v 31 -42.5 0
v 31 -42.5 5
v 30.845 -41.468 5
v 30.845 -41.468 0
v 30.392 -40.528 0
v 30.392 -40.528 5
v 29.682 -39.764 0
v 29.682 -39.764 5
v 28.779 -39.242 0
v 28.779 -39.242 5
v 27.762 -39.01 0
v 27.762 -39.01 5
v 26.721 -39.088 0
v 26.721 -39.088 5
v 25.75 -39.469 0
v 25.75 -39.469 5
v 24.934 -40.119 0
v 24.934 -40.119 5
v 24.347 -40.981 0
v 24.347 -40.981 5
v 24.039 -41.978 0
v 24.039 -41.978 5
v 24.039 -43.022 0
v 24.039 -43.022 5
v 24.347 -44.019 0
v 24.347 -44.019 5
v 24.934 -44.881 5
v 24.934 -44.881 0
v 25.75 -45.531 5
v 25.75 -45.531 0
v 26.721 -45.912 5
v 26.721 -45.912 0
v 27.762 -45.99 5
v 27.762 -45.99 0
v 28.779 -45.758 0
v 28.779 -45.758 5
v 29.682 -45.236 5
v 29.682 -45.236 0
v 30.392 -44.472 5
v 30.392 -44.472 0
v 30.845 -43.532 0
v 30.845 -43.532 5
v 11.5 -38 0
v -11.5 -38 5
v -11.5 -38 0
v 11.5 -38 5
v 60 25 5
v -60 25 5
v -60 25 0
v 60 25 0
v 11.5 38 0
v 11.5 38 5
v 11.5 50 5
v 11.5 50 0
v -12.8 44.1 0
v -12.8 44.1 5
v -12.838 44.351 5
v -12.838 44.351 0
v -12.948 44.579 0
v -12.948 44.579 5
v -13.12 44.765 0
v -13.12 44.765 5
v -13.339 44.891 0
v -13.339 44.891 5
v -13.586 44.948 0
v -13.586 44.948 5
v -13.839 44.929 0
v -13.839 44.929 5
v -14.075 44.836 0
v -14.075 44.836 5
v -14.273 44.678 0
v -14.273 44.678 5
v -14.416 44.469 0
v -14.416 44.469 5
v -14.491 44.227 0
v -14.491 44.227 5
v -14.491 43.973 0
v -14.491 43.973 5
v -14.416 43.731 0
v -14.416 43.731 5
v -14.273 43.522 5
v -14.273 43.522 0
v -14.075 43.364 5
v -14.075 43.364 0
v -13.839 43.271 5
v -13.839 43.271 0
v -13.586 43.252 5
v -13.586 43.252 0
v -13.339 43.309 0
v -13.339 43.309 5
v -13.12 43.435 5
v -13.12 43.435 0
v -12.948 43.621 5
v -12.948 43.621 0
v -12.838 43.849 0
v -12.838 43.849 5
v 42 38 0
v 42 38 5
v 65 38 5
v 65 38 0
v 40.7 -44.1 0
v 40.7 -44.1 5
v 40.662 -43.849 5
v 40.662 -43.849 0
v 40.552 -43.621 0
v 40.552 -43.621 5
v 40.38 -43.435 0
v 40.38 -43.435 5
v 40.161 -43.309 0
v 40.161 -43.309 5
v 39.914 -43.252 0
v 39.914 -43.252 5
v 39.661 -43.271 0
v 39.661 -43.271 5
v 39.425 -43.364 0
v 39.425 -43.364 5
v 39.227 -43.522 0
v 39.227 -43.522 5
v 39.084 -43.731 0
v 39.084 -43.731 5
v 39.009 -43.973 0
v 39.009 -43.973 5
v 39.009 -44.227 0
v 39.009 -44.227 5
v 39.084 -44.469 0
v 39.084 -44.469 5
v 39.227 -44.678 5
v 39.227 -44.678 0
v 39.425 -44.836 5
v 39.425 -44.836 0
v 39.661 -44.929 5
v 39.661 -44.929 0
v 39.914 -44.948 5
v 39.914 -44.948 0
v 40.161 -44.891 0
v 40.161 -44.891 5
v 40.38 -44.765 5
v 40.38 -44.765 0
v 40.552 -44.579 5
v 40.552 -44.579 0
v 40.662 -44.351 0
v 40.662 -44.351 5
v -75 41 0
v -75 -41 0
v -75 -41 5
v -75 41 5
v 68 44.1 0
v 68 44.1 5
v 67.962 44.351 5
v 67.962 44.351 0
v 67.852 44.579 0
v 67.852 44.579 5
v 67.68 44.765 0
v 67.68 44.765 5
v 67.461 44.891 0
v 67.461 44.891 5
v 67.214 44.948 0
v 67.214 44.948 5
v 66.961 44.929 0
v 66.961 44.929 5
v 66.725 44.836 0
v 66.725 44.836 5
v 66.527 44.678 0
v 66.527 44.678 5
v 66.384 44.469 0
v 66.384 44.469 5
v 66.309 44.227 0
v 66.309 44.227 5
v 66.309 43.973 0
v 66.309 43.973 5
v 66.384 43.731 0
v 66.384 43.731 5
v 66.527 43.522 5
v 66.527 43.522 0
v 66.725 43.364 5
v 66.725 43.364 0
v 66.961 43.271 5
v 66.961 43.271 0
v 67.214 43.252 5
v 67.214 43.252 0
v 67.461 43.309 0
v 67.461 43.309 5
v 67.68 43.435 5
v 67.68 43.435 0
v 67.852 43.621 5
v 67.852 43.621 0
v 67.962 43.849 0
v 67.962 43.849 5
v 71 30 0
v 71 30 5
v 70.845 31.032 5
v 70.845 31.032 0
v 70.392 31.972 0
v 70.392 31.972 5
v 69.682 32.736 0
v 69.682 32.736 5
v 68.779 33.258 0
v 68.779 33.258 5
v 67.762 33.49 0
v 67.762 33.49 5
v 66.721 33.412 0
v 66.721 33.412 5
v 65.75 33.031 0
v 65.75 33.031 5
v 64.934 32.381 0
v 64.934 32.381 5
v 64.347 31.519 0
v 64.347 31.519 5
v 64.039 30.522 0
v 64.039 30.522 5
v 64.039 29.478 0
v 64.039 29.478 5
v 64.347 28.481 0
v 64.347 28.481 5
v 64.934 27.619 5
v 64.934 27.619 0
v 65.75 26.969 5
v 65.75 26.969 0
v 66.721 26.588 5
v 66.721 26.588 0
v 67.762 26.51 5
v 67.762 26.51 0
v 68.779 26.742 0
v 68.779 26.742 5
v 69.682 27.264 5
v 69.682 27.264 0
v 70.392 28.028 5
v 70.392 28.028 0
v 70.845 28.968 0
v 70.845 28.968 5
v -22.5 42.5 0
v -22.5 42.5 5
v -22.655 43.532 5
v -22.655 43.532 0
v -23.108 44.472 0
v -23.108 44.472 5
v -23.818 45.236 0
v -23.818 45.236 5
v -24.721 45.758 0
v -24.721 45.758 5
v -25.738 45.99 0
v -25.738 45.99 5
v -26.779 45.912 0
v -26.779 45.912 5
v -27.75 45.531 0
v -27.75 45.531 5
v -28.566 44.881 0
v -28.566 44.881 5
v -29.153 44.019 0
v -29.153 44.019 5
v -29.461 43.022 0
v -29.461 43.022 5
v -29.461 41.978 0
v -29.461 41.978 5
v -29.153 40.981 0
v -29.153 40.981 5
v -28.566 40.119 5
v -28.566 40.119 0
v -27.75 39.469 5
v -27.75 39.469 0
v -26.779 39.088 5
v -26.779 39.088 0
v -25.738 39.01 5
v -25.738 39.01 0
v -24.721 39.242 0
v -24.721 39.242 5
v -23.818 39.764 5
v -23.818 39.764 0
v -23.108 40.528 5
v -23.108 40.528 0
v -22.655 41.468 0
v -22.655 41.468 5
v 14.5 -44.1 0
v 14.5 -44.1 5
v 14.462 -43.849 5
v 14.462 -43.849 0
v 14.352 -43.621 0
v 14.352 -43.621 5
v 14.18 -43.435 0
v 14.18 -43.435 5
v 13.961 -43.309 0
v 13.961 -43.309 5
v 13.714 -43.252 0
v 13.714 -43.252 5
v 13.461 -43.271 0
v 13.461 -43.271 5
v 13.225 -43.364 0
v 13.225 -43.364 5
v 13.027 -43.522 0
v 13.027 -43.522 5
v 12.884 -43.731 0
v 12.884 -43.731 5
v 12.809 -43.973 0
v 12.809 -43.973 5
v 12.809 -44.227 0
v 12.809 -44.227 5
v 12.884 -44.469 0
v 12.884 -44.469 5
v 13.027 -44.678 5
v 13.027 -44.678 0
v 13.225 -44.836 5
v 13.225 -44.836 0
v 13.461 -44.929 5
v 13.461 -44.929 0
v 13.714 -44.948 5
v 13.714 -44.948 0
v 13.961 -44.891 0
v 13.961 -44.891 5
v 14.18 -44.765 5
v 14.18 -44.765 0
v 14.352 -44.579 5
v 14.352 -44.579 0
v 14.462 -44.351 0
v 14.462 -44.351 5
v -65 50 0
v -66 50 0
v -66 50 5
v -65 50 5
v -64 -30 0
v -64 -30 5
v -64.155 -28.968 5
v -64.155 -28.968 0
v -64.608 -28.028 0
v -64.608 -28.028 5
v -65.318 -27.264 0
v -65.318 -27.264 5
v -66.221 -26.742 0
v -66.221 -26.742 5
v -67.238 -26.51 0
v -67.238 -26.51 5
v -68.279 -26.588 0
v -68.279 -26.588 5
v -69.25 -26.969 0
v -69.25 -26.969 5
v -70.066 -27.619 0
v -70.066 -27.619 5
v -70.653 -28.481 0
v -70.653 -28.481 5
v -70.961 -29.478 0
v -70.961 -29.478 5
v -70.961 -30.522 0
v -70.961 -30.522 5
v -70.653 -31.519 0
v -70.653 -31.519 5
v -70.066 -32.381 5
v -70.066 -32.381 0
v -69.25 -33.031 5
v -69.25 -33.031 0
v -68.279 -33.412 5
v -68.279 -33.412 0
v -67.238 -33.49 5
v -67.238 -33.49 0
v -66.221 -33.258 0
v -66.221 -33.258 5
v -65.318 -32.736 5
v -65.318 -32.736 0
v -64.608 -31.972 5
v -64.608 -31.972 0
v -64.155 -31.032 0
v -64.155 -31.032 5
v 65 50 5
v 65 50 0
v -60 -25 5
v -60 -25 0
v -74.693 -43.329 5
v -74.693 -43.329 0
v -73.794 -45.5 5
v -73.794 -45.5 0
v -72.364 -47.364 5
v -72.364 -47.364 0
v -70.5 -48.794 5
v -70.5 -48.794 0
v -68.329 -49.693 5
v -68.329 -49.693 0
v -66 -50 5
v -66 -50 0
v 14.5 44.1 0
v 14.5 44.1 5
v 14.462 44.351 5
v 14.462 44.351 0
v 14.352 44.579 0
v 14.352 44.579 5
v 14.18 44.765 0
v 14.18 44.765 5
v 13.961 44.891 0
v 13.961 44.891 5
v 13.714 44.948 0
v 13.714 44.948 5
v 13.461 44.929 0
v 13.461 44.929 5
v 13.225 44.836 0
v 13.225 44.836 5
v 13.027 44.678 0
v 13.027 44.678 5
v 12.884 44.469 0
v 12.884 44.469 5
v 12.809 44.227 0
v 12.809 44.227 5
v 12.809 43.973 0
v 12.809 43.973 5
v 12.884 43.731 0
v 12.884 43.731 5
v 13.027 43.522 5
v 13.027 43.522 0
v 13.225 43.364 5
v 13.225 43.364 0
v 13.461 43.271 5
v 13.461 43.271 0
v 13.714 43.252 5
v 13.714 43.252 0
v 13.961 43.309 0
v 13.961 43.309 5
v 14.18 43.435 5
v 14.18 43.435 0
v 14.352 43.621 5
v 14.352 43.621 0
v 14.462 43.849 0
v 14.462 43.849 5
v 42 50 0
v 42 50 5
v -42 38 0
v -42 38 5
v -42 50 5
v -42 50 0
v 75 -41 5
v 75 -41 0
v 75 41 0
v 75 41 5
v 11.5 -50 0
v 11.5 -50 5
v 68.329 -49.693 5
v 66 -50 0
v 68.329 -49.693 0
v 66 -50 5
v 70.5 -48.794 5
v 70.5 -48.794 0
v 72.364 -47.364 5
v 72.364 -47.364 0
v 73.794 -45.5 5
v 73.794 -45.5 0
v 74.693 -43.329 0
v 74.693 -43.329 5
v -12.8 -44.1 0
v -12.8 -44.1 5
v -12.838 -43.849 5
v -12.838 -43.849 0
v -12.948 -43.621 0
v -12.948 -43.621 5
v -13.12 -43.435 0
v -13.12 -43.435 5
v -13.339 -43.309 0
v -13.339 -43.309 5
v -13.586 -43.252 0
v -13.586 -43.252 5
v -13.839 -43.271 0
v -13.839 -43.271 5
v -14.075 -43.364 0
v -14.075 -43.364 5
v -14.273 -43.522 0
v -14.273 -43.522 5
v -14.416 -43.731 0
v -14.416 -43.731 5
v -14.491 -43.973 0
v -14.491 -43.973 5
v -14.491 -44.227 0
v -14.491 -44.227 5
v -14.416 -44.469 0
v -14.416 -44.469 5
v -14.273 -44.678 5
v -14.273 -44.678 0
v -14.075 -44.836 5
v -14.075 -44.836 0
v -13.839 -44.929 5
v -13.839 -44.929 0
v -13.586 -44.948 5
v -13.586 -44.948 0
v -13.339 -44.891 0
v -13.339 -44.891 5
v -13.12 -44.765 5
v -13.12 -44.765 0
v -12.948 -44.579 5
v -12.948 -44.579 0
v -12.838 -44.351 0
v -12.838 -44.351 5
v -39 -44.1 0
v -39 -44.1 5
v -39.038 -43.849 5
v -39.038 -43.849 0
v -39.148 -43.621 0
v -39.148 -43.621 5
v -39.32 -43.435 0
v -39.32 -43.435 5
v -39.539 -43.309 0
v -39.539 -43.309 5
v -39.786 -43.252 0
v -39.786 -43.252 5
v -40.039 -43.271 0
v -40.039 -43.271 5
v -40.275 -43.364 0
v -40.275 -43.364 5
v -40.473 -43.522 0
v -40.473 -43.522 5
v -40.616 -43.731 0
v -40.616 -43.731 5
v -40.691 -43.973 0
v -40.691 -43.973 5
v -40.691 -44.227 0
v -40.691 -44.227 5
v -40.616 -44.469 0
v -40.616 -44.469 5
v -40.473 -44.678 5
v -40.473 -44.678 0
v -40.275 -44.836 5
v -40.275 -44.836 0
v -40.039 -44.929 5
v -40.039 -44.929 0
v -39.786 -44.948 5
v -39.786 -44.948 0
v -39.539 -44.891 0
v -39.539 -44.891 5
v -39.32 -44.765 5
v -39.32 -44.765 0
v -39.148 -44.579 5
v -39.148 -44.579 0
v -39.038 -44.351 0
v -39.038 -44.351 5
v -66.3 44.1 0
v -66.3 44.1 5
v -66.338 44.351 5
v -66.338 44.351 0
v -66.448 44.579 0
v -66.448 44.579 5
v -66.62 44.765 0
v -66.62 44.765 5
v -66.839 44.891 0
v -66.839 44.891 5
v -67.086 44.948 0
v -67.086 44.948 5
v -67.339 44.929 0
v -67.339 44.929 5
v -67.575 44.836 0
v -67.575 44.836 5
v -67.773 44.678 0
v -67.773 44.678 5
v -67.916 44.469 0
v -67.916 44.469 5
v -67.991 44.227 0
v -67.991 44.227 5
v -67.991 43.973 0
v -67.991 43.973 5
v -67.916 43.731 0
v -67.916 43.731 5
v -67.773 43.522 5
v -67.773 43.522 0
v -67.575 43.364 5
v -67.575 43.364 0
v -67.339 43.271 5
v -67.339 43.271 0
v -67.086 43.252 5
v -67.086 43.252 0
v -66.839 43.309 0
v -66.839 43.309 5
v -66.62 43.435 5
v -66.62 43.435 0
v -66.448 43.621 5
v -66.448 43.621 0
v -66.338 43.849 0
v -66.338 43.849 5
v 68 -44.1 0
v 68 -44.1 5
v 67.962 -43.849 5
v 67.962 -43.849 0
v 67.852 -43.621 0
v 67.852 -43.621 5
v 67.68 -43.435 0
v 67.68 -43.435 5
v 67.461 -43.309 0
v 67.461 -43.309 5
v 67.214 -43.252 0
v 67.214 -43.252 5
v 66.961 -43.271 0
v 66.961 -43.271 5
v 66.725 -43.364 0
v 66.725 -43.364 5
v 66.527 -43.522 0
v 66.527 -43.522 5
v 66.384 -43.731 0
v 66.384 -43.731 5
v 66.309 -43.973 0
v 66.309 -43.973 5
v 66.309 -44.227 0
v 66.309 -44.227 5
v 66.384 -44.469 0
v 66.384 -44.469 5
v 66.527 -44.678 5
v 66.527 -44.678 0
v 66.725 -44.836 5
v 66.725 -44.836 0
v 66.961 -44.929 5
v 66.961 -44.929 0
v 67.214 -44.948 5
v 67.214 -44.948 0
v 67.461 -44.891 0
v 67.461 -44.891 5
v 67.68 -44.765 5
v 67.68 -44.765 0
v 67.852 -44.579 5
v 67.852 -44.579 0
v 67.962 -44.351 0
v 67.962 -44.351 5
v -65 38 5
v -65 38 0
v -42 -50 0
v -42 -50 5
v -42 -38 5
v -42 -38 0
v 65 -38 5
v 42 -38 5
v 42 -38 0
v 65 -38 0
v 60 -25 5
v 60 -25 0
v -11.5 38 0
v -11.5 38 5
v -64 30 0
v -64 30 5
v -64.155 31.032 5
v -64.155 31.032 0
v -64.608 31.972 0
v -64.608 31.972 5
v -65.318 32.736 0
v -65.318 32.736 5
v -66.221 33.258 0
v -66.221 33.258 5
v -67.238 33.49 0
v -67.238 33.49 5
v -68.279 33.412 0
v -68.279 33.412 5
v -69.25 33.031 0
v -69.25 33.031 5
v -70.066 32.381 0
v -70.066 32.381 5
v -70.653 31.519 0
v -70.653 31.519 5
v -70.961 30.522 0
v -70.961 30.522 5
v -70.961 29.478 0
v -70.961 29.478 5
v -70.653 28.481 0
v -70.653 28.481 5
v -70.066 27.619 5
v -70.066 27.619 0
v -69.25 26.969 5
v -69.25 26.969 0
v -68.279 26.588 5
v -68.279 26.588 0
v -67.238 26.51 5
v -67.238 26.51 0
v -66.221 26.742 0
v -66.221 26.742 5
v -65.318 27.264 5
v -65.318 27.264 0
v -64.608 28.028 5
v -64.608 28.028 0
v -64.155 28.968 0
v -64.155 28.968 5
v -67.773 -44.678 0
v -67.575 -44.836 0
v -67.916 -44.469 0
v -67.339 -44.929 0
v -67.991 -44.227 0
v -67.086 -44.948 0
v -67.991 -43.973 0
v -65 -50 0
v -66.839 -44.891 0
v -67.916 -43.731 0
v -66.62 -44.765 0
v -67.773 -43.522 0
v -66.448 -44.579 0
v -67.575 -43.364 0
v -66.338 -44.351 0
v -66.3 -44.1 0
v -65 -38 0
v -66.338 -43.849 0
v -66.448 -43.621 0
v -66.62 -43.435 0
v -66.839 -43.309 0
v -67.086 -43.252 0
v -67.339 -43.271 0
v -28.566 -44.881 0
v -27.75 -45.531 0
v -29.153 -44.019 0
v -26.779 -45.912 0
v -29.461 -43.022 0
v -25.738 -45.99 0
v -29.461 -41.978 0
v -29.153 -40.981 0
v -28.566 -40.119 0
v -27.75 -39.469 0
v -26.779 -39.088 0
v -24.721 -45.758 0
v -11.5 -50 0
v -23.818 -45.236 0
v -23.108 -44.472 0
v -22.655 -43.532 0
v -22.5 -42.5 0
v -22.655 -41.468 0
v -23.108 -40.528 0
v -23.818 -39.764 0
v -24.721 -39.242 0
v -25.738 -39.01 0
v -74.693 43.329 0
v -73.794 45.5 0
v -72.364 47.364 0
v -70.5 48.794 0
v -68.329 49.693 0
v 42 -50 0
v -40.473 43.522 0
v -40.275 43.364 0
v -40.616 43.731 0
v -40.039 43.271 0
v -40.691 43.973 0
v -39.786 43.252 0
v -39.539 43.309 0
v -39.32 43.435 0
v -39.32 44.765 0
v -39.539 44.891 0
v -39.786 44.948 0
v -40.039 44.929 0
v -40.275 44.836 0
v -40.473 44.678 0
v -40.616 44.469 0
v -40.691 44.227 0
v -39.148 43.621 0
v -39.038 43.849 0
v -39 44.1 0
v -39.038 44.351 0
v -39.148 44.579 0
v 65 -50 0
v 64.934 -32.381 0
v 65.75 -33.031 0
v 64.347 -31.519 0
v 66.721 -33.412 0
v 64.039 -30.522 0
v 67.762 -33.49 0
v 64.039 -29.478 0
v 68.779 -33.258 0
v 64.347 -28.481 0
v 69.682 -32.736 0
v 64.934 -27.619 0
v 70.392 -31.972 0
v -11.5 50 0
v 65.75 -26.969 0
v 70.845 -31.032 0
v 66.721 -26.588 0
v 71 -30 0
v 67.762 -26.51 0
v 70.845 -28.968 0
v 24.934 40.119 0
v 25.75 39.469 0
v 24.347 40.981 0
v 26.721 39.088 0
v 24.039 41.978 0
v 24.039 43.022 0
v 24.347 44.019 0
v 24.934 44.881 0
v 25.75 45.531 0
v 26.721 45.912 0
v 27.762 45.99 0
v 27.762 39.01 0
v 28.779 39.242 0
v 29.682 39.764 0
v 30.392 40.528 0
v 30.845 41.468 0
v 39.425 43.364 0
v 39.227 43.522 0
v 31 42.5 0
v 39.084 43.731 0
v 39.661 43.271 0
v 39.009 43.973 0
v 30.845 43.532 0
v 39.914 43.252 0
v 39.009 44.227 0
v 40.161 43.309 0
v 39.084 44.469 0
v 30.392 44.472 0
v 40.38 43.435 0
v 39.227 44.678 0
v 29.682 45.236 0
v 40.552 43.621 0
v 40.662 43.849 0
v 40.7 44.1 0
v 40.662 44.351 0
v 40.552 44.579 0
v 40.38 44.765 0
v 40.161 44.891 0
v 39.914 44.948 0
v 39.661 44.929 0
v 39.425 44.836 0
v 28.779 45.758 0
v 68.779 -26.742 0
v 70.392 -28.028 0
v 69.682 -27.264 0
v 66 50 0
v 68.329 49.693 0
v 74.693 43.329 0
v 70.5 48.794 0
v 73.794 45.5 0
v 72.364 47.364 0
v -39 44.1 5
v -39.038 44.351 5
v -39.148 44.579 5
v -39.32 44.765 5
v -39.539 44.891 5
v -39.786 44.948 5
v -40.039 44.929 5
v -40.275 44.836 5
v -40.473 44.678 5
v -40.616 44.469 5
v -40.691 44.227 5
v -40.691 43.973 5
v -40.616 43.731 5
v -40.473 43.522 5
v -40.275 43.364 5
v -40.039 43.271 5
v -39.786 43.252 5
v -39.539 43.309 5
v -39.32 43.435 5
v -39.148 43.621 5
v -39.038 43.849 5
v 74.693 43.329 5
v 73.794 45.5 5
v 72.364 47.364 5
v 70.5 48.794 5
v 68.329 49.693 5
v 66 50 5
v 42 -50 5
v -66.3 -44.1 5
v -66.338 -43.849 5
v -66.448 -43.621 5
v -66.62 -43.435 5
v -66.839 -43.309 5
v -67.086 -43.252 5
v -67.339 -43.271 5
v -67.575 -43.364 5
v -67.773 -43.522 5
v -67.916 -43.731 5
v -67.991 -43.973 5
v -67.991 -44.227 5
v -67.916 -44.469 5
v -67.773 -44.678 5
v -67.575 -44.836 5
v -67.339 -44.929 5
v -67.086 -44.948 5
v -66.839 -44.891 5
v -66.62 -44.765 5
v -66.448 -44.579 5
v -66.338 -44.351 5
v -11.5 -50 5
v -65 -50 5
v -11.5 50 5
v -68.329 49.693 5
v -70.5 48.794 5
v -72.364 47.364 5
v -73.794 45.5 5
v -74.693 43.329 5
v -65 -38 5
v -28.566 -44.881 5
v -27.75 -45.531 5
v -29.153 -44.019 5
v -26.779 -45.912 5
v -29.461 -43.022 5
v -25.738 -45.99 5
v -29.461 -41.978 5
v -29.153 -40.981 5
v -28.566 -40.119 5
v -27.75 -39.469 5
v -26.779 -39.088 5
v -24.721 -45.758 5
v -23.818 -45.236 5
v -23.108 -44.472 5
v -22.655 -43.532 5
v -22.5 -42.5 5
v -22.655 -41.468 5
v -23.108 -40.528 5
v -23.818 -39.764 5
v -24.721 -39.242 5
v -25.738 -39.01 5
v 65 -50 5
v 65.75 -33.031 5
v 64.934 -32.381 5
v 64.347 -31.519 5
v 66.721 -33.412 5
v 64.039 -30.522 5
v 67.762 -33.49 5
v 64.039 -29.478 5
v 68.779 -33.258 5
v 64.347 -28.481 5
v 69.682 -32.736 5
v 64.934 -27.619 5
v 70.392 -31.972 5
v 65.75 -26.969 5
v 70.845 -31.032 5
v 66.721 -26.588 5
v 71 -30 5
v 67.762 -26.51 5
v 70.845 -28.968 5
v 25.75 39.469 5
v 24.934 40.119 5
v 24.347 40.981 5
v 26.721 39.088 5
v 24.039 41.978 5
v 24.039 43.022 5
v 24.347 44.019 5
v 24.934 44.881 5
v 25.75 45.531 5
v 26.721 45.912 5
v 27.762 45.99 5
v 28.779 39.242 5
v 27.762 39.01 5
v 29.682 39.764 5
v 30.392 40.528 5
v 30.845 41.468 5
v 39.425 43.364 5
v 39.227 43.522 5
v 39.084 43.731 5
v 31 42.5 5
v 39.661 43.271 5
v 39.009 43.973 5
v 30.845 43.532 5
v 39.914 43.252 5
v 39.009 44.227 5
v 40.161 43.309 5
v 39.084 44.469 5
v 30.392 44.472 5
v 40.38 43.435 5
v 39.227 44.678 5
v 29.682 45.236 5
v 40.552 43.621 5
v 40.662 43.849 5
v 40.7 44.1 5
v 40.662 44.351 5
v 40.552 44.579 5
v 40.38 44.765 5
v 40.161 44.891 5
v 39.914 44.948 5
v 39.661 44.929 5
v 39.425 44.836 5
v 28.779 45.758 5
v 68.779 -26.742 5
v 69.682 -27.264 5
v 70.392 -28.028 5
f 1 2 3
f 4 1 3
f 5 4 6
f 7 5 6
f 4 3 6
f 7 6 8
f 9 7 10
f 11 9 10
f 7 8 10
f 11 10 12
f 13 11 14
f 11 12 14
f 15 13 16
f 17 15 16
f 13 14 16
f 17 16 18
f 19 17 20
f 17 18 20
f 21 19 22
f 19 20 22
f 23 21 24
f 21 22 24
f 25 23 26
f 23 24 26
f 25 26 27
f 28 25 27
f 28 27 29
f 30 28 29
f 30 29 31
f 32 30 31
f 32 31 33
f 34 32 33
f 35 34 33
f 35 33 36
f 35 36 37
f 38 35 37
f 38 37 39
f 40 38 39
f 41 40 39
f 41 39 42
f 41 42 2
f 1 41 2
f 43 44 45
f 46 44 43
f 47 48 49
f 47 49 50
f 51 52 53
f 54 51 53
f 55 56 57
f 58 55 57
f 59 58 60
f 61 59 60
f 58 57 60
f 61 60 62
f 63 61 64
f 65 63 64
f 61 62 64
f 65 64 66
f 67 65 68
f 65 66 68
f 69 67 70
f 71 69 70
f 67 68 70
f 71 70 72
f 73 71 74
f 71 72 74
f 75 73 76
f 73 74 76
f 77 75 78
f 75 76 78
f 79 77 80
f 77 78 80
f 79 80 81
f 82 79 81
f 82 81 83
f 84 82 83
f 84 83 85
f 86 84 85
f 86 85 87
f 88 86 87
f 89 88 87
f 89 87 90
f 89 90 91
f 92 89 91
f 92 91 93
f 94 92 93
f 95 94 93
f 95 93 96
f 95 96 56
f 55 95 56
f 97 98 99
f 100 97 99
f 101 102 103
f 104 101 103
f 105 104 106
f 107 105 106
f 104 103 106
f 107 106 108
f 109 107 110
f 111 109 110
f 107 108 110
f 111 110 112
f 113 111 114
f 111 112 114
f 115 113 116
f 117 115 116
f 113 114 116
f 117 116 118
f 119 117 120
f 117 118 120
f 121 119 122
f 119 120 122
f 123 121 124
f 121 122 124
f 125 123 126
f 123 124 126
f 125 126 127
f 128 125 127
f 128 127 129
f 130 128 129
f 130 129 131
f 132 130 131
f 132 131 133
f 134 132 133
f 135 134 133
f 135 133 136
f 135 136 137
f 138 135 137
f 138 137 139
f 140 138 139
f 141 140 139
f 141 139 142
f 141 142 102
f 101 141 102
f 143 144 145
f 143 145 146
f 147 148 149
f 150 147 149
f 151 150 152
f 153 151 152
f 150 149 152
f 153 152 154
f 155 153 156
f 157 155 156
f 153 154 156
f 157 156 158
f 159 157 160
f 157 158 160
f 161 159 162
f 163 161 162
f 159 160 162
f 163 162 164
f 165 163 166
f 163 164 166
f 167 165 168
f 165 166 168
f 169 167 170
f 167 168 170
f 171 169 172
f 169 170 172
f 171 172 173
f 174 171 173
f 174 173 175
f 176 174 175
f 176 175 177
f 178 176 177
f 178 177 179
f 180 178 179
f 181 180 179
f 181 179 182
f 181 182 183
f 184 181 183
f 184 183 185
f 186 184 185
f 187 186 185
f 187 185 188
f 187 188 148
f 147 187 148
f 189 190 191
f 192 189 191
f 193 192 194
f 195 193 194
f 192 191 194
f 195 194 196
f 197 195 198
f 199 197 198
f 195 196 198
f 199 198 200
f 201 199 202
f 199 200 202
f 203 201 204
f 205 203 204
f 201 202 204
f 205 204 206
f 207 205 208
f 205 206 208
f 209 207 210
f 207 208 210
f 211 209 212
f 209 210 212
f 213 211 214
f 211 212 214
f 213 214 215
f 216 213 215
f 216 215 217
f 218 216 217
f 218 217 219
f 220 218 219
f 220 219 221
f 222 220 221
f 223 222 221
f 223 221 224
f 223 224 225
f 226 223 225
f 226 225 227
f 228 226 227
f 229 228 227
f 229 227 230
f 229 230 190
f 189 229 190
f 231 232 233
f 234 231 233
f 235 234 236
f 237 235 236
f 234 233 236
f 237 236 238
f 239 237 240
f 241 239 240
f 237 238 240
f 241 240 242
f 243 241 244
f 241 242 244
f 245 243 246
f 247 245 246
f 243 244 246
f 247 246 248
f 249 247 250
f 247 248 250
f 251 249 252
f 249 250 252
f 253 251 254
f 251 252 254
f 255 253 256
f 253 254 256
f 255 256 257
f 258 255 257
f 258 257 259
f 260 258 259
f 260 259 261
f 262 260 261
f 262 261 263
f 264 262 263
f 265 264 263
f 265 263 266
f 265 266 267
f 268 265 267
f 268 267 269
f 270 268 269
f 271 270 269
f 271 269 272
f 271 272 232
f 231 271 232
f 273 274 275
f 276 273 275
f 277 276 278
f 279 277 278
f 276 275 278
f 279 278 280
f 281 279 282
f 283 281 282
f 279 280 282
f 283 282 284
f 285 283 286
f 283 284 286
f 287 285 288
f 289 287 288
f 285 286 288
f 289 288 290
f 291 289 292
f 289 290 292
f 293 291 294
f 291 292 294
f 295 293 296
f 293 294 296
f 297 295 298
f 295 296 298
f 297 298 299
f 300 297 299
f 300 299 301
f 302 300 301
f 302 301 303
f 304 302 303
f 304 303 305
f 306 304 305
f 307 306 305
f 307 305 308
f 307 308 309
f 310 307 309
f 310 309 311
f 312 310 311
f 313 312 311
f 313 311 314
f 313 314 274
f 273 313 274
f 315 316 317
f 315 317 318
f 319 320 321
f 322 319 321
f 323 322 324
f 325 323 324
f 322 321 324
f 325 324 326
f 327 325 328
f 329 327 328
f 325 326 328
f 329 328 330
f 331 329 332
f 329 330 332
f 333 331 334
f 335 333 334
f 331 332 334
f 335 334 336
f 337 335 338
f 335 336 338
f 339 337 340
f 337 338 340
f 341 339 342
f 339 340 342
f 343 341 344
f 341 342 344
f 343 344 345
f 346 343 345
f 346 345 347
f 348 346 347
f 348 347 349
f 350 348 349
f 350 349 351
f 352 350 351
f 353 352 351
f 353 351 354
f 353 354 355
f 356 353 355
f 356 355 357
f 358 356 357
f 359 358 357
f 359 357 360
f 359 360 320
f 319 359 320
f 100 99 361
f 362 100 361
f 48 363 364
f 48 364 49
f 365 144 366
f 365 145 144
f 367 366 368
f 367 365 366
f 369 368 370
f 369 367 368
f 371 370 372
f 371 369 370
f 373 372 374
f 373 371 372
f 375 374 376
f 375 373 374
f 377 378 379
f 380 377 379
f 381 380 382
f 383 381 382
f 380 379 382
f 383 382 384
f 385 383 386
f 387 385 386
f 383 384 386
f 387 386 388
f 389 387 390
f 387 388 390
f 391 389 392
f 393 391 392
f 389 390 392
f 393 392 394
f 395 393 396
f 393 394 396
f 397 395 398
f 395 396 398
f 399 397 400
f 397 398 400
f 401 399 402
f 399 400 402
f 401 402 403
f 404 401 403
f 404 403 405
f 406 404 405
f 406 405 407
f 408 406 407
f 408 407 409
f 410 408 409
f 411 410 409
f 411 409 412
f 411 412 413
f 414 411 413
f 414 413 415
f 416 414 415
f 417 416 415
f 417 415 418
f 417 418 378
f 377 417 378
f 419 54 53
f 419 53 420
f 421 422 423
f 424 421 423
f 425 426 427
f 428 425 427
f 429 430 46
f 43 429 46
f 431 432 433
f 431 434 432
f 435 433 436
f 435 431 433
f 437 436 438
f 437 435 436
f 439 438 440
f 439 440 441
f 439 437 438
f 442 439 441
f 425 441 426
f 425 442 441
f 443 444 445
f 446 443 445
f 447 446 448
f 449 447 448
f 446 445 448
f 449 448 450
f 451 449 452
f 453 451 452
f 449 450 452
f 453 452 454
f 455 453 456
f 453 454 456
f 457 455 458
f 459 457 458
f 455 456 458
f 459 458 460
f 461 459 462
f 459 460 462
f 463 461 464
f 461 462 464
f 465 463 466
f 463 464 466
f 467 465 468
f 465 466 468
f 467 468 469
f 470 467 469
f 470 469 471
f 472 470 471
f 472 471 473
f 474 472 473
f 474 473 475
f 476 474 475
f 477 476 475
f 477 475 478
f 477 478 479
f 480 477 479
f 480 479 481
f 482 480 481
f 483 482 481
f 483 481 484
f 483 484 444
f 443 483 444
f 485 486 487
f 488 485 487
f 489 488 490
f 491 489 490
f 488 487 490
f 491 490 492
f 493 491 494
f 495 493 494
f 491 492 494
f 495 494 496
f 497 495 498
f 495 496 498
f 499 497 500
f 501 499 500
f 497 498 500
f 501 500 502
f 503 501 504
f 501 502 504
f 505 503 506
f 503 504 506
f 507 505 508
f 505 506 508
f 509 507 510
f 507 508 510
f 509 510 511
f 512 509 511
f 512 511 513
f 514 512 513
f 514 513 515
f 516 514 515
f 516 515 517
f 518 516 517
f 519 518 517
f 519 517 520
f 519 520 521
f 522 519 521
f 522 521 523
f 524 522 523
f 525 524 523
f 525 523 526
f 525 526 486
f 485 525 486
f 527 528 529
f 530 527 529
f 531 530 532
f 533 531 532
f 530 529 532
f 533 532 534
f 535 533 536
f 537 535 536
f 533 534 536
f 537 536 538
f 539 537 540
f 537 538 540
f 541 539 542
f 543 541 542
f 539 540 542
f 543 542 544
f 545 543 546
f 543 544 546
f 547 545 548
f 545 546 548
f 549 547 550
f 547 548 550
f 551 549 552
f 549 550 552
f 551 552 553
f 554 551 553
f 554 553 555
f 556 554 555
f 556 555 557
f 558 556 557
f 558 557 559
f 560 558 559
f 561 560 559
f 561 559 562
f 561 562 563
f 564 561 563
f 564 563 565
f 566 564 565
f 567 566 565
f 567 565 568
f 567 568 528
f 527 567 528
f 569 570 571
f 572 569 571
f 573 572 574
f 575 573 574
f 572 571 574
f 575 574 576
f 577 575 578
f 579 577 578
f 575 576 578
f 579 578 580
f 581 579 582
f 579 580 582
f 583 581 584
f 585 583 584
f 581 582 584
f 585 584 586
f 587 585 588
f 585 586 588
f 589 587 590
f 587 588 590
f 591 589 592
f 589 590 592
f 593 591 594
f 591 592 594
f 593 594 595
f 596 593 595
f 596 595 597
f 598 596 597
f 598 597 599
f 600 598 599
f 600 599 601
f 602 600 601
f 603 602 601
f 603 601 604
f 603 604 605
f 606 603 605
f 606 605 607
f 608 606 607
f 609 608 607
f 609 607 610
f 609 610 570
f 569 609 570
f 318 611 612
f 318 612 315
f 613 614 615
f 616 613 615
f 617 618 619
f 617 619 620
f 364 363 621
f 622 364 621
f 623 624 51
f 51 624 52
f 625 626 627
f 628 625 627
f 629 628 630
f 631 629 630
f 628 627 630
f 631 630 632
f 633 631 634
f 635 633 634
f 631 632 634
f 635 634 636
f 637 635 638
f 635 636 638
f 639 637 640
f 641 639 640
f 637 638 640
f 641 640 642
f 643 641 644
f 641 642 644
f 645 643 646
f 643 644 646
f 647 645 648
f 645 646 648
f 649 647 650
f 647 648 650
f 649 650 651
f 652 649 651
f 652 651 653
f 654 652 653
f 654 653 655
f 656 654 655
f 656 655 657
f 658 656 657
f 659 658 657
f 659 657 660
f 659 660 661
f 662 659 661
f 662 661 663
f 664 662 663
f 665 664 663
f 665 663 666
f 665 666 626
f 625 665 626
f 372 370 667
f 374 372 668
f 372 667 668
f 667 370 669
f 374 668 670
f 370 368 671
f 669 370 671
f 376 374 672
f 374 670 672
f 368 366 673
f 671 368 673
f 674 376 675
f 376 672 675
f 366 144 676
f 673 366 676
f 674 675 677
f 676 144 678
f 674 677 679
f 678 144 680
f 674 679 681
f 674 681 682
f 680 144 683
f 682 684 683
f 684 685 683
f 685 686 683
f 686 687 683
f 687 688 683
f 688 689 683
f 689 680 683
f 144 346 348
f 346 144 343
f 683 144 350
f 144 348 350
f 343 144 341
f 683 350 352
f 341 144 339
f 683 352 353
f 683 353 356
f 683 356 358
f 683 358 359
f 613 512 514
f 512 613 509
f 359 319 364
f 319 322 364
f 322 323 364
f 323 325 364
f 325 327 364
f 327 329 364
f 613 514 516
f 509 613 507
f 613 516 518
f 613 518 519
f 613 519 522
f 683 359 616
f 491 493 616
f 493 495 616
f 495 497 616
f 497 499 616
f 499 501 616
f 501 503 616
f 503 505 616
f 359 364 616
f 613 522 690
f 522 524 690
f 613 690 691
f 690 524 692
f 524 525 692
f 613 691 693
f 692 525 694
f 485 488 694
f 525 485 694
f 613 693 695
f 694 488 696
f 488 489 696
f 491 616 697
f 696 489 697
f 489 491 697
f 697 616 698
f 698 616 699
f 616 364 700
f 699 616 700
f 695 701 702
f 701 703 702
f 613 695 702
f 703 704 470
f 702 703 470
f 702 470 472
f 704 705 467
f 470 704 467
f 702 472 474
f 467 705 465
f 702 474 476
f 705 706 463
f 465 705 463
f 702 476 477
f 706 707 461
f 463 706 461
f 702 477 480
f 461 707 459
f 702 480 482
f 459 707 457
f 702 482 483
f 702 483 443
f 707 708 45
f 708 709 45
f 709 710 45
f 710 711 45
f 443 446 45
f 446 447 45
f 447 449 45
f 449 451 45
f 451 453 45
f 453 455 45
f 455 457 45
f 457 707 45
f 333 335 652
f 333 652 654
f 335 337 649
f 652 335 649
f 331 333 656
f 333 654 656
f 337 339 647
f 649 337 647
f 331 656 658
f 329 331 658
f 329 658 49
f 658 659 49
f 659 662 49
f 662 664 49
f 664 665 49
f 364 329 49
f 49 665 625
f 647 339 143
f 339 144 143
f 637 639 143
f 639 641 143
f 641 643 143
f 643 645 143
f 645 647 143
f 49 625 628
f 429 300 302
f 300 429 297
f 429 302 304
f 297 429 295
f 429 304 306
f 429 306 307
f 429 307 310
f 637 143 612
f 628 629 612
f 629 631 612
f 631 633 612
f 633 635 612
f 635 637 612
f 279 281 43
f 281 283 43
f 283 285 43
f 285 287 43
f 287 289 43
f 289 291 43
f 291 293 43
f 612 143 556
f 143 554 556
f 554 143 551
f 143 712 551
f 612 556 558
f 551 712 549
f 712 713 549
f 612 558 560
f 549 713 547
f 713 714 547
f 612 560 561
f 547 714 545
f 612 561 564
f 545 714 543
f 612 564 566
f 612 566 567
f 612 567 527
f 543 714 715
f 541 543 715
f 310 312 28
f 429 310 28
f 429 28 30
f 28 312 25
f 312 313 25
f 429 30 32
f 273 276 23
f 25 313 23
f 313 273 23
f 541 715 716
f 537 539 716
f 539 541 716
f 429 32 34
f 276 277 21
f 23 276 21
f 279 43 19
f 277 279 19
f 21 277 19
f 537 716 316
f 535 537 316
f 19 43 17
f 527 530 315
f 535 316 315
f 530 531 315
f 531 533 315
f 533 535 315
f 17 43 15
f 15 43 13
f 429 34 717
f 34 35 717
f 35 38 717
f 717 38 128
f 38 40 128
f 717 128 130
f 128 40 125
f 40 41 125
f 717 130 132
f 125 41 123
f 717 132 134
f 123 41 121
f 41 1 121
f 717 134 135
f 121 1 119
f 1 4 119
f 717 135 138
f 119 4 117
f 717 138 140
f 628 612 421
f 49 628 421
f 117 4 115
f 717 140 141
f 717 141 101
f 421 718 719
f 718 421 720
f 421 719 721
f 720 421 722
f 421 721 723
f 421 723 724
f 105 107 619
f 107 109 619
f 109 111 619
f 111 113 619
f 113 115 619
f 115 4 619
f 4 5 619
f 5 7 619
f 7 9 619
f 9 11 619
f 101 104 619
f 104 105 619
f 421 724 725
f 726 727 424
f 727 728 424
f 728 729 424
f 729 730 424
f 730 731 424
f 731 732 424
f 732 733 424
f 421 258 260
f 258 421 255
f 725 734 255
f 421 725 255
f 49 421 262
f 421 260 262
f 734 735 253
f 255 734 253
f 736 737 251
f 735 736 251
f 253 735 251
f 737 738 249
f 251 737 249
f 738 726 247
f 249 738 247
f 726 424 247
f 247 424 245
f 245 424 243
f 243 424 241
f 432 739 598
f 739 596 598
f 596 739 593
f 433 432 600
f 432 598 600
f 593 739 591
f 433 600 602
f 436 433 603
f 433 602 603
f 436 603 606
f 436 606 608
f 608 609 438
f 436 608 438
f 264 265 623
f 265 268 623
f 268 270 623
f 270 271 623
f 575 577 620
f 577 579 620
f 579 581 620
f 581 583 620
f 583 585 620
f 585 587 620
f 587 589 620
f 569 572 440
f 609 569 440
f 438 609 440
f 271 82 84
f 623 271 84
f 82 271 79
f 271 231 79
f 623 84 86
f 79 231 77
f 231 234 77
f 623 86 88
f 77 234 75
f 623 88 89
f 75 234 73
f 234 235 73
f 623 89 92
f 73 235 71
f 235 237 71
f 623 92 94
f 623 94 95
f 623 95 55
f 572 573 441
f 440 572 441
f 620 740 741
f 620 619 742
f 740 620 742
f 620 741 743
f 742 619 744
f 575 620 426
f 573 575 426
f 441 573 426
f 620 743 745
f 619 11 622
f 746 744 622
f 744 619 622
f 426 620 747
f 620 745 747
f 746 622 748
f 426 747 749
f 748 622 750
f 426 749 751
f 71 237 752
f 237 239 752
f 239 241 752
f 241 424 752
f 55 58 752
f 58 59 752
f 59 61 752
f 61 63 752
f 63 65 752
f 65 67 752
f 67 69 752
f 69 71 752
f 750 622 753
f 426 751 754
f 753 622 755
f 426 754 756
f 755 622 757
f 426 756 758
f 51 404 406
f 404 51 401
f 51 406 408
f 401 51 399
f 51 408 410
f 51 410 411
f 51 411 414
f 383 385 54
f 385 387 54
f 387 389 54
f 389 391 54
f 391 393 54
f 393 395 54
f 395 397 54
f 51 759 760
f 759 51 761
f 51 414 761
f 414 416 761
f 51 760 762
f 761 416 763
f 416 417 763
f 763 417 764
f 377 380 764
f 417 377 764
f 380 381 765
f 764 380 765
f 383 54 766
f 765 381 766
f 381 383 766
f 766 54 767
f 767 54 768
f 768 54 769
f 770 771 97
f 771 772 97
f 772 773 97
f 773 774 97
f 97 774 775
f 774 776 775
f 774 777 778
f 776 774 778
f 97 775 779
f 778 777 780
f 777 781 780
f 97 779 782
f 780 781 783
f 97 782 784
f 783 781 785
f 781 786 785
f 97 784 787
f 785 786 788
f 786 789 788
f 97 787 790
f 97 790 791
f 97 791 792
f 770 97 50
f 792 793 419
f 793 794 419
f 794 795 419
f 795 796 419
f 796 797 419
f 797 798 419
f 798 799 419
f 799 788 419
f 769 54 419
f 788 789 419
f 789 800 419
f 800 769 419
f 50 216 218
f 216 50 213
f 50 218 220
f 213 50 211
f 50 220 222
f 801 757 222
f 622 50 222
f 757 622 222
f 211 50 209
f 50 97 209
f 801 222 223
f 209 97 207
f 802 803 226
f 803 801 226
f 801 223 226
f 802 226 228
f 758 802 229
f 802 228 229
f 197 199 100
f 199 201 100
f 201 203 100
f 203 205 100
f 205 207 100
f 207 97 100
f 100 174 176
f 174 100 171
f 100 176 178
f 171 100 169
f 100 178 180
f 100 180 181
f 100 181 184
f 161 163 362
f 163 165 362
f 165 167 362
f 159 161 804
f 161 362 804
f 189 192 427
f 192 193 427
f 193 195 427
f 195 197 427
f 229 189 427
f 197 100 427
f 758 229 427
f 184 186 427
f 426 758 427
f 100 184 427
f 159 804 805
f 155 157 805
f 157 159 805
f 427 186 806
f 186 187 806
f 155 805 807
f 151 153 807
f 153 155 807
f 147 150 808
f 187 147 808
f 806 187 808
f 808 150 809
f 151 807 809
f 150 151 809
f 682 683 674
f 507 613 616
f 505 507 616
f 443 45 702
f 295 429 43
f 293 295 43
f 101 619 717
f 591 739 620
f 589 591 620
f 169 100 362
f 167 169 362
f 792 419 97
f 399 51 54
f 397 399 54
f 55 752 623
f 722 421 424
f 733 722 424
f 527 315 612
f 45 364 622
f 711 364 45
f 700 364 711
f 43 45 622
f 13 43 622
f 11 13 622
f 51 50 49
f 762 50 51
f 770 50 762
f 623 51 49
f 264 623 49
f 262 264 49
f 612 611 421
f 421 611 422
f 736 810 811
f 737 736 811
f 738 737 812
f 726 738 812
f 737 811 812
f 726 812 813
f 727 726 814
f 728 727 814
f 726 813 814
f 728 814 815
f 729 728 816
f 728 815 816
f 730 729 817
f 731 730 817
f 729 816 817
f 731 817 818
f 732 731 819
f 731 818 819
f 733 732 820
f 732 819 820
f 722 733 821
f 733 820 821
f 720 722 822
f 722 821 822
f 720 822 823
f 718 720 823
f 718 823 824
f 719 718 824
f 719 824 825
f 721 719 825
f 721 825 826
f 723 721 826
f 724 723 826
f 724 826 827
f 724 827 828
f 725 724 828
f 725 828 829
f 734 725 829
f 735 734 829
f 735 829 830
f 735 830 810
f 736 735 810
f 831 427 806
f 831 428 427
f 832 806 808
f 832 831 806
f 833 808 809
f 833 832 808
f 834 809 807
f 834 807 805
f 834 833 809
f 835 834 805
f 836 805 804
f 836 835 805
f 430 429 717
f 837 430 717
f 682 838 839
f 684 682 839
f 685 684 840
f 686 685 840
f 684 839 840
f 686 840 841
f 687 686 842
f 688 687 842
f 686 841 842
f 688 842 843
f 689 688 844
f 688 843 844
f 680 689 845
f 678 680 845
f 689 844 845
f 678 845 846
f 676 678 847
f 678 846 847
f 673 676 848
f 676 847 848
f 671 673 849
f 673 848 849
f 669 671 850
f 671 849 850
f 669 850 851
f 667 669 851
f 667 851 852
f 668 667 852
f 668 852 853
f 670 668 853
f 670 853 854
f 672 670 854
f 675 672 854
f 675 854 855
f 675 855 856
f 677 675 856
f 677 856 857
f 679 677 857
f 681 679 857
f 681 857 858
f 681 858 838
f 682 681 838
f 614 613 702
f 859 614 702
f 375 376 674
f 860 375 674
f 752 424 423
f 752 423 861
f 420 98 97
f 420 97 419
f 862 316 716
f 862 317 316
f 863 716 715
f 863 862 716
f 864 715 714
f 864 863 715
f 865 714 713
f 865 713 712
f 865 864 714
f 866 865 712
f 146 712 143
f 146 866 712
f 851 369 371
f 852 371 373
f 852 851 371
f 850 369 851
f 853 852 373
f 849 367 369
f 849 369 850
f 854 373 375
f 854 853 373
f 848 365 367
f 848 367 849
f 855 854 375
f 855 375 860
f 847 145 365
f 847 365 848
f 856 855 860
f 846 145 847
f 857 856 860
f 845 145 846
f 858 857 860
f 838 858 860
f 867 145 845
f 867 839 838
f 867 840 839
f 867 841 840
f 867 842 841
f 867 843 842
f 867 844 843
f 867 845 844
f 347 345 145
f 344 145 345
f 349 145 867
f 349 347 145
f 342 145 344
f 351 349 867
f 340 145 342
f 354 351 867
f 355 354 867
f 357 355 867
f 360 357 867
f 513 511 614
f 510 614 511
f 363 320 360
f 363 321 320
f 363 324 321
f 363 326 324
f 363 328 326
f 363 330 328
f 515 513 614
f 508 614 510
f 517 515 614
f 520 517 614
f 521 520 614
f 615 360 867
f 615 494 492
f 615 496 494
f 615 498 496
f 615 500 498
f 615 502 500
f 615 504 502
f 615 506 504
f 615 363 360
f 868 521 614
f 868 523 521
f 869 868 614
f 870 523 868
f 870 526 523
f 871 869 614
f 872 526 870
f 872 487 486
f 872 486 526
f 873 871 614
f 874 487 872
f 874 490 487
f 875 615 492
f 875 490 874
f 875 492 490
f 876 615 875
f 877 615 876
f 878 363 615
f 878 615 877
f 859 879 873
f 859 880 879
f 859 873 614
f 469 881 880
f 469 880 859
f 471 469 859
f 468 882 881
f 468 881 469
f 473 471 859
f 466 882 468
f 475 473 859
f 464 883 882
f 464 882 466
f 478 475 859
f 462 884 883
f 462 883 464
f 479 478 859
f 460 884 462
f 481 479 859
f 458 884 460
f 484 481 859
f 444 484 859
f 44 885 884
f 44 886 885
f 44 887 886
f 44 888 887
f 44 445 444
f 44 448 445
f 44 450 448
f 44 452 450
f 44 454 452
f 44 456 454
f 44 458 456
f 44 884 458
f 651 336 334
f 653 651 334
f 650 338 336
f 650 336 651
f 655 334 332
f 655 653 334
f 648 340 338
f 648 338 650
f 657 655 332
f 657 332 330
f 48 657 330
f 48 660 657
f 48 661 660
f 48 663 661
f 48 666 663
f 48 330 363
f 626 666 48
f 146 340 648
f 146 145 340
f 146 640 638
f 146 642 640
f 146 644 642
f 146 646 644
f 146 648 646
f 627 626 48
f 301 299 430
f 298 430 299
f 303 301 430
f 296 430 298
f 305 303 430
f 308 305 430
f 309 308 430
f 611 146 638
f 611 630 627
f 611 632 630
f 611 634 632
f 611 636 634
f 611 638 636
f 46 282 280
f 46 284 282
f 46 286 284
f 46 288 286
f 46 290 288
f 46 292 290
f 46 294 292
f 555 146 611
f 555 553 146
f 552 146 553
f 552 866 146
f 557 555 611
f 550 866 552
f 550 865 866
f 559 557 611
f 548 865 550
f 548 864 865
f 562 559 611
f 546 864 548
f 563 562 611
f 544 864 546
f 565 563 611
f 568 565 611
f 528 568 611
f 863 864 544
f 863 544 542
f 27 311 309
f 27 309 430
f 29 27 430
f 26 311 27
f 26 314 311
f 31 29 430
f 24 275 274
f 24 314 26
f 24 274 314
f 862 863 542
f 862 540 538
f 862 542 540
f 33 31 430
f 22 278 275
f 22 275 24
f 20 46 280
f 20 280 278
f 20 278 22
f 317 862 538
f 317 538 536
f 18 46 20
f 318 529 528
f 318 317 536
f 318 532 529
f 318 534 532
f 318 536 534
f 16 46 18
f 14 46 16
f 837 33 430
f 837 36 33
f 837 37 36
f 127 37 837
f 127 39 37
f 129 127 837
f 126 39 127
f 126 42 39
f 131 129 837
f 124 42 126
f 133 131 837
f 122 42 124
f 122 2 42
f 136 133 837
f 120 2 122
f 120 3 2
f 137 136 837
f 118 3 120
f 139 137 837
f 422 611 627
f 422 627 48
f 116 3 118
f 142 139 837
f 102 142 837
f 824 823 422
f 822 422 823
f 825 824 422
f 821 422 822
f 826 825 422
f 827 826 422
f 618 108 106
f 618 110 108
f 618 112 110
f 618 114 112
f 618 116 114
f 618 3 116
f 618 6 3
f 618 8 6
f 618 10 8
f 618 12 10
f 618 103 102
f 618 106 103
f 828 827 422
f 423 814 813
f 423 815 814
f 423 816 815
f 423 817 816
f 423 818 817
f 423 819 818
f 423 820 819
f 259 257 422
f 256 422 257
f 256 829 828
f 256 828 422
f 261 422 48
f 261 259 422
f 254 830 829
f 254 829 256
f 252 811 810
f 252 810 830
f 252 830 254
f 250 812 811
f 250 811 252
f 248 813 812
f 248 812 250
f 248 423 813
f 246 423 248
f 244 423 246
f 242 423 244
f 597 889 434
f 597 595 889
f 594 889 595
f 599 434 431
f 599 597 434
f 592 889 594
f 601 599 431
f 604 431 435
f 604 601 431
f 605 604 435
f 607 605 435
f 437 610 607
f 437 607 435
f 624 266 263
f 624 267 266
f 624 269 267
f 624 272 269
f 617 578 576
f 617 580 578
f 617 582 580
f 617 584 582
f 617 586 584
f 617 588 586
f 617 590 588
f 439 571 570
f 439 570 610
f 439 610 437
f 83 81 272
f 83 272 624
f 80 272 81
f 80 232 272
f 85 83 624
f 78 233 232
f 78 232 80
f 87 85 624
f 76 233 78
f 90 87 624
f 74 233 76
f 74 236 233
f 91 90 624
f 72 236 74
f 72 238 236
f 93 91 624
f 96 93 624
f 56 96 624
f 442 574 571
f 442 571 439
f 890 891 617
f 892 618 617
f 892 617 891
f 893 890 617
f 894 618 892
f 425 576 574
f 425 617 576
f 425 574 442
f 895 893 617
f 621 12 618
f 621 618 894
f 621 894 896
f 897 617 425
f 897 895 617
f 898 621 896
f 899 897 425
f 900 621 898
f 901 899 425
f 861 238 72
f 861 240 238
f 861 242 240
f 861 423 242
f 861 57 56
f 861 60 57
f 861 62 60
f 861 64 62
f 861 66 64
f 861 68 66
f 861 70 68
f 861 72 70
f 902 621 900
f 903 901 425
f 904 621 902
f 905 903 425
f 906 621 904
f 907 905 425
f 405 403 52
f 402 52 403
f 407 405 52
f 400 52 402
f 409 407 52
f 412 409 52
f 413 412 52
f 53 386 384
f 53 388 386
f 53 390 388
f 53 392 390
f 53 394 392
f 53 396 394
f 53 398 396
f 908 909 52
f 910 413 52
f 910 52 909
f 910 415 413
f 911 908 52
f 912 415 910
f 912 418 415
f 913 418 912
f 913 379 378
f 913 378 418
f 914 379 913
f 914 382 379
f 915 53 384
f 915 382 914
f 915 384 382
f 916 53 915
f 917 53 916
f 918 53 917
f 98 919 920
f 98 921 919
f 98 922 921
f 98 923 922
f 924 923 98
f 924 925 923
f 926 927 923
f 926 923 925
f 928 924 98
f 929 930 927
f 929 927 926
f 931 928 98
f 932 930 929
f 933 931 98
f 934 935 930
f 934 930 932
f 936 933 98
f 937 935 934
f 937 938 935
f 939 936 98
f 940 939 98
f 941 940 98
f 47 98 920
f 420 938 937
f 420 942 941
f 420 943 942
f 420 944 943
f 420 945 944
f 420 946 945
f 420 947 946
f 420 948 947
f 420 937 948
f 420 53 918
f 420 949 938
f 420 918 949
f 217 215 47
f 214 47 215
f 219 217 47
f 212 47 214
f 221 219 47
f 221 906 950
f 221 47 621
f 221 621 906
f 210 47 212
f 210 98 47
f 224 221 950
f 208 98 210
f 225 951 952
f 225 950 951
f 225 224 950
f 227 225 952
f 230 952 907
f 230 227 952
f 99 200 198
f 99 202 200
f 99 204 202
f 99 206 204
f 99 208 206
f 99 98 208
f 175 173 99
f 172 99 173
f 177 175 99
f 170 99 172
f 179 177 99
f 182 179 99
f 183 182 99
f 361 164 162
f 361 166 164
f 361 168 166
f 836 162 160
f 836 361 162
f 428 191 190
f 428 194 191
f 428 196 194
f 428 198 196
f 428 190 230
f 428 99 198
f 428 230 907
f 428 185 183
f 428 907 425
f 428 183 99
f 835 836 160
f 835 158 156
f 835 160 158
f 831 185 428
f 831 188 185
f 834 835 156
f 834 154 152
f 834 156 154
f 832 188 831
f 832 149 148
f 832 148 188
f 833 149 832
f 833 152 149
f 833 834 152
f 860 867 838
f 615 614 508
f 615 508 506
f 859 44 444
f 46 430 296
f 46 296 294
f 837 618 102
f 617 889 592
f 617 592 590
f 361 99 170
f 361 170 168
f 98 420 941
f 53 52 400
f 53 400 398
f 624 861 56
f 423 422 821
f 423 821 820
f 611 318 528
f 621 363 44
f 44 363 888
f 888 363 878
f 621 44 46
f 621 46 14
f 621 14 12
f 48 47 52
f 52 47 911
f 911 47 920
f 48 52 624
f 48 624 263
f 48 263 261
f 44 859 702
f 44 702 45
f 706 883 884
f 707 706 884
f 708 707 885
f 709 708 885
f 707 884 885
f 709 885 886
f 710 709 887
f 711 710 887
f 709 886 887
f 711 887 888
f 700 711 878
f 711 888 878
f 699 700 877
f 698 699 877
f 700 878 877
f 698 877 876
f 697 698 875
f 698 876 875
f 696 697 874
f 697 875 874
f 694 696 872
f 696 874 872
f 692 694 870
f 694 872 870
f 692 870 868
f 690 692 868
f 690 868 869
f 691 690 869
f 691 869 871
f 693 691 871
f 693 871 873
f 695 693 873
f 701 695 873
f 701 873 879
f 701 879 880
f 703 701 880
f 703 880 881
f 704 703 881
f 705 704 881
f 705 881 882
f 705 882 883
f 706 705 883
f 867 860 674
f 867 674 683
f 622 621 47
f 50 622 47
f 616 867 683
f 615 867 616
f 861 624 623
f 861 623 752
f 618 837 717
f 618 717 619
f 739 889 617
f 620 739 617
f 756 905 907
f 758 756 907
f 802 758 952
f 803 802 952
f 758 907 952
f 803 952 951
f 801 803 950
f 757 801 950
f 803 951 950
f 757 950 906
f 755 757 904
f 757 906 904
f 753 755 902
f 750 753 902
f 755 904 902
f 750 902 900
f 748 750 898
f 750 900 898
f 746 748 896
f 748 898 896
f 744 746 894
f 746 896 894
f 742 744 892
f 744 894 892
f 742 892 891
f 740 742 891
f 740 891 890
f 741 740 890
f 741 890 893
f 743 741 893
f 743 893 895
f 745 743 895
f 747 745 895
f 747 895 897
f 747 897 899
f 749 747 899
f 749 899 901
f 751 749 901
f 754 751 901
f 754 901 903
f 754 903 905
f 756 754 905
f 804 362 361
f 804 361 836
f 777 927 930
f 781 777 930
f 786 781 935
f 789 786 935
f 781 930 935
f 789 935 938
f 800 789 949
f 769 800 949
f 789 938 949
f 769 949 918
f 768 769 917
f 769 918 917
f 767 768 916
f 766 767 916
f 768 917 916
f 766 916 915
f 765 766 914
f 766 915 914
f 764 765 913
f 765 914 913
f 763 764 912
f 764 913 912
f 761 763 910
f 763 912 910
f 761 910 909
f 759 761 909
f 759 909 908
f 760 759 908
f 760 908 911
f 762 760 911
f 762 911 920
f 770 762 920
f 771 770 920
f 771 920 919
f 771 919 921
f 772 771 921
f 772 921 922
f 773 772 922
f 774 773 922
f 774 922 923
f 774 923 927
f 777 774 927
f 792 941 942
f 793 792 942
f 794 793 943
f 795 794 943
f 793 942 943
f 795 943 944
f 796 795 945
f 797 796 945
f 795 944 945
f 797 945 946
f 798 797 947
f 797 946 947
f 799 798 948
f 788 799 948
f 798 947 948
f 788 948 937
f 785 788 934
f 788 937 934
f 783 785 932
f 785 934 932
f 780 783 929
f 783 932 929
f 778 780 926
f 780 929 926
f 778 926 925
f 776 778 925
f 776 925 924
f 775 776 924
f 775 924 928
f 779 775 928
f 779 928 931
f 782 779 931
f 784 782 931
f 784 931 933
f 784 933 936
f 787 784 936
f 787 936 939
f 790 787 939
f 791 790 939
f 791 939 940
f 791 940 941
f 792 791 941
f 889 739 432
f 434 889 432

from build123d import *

# Parameters (mm, degrees)
SKETCH_W        = 150
SKETCH_H        = 100
PAD_DEPTH       = 5
SKETCH001_W     = 23
SKETCH001_H     = 12
POCKET_DEPTH    = 16
SKETCH002_R     = 0.85
SKETCH002_R_2   = 3.5
SKETCH002_W     = 120
SKETCH002_H     = 50
POCKET001_DEPTH = 10
SKETCH003_R     = 3.5
POCKET002_DEPTH = 10
FILLET_R        = 9
FILLET001_R     = 9
FILLET002_R     = 9
FILLET003_R     = 9


with BuildPart() as part:
    # Sketch → Pad (new body)
    with BuildSketch(Plane.XY):
        Rectangle(SKETCH_W, SKETCH_H)
    extrude(amount=PAD_DEPTH)

    # Sketch001 (on Face6 of Pad) → Pocket (cut)
    with BuildSketch(Plane.XY.offset(5)):
        with Locations((-53.5, 44)):
            Rectangle(SKETCH001_W, SKETCH001_H)
        with Locations((-53.5, -44)):
            Rectangle(SKETCH001_W, SKETCH001_H)
        with Locations((0, 44)):
            Rectangle(SKETCH001_W, SKETCH001_H)
        with Locations((0, -44)):
            Rectangle(SKETCH001_W, SKETCH001_H)
        with Locations((53.5, 44)):
            Rectangle(SKETCH001_W, SKETCH001_H)
        with Locations((53.5, -44)):
            Rectangle(SKETCH001_W, SKETCH001_H)
    extrude(amount=-POCKET_DEPTH, mode=Mode.SUBTRACT)

    # Sketch002 (on Face4 of Pocket) → Pocket001 (cut)
    with BuildSketch(Plane.XY.offset(5)):
        with Locations((-39.85, -44.1)):
            Circle(SKETCH002_R)
        with Locations((-67.15, 44.1)):
            Circle(SKETCH002_R)
        with Locations((-39.85, 44.1)):
            Circle(SKETCH002_R)
        with Locations((-13.65, 44.1)):
            Circle(SKETCH002_R)
        with Locations((13.65, 44.1)):
            Circle(SKETCH002_R)
        with Locations((39.85, 44.1)):
            Circle(SKETCH002_R)
        with Locations((67.15, 44.1)):
            Circle(SKETCH002_R)
        with Locations((39.85, -44.1)):
            Circle(SKETCH002_R)
        with Locations((67.15, -44.1)):
            Circle(SKETCH002_R)
        with Locations((13.65, -44.1)):
            Circle(SKETCH002_R)
        with Locations((-13.65, -44.1)):
            Circle(SKETCH002_R)
        with Locations((-67.15, -44.1)):
            Circle(SKETCH002_R)
        with Locations((67.5, 30)):
            Circle(SKETCH002_R_2)
        with Locations((67.5, -30)):
            Circle(SKETCH002_R_2)
        with Locations((-67.5, 30)):
            Circle(SKETCH002_R_2)
        with Locations((-67.5, -30)):
            Circle(SKETCH002_R_2)
        Rectangle(SKETCH002_W, SKETCH002_H)
    extrude(amount=-POCKET001_DEPTH, mode=Mode.SUBTRACT)

    # Sketch003 → Pocket002 (cut)
    with BuildSketch(Plane.XY.offset(7)):
        with Locations((-26, -42.5)):
            Circle(SKETCH003_R)
        with Locations((27.5, -42.5)):
            Circle(SKETCH003_R)
        with Locations((-26, 42.5)):
            Circle(SKETCH003_R)
        with Locations((27.5, 42.5)):
            Circle(SKETCH003_R)
    extrude(amount=-POCKET002_DEPTH, mode=Mode.SUBTRACT)

    # Fillet
    fillet_edges = [part.edges().sort_by_distance(p)[0] for p in [
        (75, -50, 2.5),
    ]]
    fillet(fillet_edges, radius=FILLET_R)

    # Fillet001
    fillet001_edges = [part.edges().sort_by_distance(p)[0] for p in [
        (75, 50, 2.5),
    ]]
    fillet(fillet001_edges, radius=FILLET001_R)

    # Fillet002
    fillet002_edges = [part.edges().sort_by_distance(p)[0] for p in [
        (-75, 50, 2.5),
    ]]
    fillet(fillet002_edges, radius=FILLET002_R)

    # Fillet003
    fillet003_edges = [part.edges().sort_by_distance(p)[0] for p in [
        (-75, -50, 2.5),
    ]]
    fillet(fillet003_edges, radius=FILLET003_R)


solid = part.part
